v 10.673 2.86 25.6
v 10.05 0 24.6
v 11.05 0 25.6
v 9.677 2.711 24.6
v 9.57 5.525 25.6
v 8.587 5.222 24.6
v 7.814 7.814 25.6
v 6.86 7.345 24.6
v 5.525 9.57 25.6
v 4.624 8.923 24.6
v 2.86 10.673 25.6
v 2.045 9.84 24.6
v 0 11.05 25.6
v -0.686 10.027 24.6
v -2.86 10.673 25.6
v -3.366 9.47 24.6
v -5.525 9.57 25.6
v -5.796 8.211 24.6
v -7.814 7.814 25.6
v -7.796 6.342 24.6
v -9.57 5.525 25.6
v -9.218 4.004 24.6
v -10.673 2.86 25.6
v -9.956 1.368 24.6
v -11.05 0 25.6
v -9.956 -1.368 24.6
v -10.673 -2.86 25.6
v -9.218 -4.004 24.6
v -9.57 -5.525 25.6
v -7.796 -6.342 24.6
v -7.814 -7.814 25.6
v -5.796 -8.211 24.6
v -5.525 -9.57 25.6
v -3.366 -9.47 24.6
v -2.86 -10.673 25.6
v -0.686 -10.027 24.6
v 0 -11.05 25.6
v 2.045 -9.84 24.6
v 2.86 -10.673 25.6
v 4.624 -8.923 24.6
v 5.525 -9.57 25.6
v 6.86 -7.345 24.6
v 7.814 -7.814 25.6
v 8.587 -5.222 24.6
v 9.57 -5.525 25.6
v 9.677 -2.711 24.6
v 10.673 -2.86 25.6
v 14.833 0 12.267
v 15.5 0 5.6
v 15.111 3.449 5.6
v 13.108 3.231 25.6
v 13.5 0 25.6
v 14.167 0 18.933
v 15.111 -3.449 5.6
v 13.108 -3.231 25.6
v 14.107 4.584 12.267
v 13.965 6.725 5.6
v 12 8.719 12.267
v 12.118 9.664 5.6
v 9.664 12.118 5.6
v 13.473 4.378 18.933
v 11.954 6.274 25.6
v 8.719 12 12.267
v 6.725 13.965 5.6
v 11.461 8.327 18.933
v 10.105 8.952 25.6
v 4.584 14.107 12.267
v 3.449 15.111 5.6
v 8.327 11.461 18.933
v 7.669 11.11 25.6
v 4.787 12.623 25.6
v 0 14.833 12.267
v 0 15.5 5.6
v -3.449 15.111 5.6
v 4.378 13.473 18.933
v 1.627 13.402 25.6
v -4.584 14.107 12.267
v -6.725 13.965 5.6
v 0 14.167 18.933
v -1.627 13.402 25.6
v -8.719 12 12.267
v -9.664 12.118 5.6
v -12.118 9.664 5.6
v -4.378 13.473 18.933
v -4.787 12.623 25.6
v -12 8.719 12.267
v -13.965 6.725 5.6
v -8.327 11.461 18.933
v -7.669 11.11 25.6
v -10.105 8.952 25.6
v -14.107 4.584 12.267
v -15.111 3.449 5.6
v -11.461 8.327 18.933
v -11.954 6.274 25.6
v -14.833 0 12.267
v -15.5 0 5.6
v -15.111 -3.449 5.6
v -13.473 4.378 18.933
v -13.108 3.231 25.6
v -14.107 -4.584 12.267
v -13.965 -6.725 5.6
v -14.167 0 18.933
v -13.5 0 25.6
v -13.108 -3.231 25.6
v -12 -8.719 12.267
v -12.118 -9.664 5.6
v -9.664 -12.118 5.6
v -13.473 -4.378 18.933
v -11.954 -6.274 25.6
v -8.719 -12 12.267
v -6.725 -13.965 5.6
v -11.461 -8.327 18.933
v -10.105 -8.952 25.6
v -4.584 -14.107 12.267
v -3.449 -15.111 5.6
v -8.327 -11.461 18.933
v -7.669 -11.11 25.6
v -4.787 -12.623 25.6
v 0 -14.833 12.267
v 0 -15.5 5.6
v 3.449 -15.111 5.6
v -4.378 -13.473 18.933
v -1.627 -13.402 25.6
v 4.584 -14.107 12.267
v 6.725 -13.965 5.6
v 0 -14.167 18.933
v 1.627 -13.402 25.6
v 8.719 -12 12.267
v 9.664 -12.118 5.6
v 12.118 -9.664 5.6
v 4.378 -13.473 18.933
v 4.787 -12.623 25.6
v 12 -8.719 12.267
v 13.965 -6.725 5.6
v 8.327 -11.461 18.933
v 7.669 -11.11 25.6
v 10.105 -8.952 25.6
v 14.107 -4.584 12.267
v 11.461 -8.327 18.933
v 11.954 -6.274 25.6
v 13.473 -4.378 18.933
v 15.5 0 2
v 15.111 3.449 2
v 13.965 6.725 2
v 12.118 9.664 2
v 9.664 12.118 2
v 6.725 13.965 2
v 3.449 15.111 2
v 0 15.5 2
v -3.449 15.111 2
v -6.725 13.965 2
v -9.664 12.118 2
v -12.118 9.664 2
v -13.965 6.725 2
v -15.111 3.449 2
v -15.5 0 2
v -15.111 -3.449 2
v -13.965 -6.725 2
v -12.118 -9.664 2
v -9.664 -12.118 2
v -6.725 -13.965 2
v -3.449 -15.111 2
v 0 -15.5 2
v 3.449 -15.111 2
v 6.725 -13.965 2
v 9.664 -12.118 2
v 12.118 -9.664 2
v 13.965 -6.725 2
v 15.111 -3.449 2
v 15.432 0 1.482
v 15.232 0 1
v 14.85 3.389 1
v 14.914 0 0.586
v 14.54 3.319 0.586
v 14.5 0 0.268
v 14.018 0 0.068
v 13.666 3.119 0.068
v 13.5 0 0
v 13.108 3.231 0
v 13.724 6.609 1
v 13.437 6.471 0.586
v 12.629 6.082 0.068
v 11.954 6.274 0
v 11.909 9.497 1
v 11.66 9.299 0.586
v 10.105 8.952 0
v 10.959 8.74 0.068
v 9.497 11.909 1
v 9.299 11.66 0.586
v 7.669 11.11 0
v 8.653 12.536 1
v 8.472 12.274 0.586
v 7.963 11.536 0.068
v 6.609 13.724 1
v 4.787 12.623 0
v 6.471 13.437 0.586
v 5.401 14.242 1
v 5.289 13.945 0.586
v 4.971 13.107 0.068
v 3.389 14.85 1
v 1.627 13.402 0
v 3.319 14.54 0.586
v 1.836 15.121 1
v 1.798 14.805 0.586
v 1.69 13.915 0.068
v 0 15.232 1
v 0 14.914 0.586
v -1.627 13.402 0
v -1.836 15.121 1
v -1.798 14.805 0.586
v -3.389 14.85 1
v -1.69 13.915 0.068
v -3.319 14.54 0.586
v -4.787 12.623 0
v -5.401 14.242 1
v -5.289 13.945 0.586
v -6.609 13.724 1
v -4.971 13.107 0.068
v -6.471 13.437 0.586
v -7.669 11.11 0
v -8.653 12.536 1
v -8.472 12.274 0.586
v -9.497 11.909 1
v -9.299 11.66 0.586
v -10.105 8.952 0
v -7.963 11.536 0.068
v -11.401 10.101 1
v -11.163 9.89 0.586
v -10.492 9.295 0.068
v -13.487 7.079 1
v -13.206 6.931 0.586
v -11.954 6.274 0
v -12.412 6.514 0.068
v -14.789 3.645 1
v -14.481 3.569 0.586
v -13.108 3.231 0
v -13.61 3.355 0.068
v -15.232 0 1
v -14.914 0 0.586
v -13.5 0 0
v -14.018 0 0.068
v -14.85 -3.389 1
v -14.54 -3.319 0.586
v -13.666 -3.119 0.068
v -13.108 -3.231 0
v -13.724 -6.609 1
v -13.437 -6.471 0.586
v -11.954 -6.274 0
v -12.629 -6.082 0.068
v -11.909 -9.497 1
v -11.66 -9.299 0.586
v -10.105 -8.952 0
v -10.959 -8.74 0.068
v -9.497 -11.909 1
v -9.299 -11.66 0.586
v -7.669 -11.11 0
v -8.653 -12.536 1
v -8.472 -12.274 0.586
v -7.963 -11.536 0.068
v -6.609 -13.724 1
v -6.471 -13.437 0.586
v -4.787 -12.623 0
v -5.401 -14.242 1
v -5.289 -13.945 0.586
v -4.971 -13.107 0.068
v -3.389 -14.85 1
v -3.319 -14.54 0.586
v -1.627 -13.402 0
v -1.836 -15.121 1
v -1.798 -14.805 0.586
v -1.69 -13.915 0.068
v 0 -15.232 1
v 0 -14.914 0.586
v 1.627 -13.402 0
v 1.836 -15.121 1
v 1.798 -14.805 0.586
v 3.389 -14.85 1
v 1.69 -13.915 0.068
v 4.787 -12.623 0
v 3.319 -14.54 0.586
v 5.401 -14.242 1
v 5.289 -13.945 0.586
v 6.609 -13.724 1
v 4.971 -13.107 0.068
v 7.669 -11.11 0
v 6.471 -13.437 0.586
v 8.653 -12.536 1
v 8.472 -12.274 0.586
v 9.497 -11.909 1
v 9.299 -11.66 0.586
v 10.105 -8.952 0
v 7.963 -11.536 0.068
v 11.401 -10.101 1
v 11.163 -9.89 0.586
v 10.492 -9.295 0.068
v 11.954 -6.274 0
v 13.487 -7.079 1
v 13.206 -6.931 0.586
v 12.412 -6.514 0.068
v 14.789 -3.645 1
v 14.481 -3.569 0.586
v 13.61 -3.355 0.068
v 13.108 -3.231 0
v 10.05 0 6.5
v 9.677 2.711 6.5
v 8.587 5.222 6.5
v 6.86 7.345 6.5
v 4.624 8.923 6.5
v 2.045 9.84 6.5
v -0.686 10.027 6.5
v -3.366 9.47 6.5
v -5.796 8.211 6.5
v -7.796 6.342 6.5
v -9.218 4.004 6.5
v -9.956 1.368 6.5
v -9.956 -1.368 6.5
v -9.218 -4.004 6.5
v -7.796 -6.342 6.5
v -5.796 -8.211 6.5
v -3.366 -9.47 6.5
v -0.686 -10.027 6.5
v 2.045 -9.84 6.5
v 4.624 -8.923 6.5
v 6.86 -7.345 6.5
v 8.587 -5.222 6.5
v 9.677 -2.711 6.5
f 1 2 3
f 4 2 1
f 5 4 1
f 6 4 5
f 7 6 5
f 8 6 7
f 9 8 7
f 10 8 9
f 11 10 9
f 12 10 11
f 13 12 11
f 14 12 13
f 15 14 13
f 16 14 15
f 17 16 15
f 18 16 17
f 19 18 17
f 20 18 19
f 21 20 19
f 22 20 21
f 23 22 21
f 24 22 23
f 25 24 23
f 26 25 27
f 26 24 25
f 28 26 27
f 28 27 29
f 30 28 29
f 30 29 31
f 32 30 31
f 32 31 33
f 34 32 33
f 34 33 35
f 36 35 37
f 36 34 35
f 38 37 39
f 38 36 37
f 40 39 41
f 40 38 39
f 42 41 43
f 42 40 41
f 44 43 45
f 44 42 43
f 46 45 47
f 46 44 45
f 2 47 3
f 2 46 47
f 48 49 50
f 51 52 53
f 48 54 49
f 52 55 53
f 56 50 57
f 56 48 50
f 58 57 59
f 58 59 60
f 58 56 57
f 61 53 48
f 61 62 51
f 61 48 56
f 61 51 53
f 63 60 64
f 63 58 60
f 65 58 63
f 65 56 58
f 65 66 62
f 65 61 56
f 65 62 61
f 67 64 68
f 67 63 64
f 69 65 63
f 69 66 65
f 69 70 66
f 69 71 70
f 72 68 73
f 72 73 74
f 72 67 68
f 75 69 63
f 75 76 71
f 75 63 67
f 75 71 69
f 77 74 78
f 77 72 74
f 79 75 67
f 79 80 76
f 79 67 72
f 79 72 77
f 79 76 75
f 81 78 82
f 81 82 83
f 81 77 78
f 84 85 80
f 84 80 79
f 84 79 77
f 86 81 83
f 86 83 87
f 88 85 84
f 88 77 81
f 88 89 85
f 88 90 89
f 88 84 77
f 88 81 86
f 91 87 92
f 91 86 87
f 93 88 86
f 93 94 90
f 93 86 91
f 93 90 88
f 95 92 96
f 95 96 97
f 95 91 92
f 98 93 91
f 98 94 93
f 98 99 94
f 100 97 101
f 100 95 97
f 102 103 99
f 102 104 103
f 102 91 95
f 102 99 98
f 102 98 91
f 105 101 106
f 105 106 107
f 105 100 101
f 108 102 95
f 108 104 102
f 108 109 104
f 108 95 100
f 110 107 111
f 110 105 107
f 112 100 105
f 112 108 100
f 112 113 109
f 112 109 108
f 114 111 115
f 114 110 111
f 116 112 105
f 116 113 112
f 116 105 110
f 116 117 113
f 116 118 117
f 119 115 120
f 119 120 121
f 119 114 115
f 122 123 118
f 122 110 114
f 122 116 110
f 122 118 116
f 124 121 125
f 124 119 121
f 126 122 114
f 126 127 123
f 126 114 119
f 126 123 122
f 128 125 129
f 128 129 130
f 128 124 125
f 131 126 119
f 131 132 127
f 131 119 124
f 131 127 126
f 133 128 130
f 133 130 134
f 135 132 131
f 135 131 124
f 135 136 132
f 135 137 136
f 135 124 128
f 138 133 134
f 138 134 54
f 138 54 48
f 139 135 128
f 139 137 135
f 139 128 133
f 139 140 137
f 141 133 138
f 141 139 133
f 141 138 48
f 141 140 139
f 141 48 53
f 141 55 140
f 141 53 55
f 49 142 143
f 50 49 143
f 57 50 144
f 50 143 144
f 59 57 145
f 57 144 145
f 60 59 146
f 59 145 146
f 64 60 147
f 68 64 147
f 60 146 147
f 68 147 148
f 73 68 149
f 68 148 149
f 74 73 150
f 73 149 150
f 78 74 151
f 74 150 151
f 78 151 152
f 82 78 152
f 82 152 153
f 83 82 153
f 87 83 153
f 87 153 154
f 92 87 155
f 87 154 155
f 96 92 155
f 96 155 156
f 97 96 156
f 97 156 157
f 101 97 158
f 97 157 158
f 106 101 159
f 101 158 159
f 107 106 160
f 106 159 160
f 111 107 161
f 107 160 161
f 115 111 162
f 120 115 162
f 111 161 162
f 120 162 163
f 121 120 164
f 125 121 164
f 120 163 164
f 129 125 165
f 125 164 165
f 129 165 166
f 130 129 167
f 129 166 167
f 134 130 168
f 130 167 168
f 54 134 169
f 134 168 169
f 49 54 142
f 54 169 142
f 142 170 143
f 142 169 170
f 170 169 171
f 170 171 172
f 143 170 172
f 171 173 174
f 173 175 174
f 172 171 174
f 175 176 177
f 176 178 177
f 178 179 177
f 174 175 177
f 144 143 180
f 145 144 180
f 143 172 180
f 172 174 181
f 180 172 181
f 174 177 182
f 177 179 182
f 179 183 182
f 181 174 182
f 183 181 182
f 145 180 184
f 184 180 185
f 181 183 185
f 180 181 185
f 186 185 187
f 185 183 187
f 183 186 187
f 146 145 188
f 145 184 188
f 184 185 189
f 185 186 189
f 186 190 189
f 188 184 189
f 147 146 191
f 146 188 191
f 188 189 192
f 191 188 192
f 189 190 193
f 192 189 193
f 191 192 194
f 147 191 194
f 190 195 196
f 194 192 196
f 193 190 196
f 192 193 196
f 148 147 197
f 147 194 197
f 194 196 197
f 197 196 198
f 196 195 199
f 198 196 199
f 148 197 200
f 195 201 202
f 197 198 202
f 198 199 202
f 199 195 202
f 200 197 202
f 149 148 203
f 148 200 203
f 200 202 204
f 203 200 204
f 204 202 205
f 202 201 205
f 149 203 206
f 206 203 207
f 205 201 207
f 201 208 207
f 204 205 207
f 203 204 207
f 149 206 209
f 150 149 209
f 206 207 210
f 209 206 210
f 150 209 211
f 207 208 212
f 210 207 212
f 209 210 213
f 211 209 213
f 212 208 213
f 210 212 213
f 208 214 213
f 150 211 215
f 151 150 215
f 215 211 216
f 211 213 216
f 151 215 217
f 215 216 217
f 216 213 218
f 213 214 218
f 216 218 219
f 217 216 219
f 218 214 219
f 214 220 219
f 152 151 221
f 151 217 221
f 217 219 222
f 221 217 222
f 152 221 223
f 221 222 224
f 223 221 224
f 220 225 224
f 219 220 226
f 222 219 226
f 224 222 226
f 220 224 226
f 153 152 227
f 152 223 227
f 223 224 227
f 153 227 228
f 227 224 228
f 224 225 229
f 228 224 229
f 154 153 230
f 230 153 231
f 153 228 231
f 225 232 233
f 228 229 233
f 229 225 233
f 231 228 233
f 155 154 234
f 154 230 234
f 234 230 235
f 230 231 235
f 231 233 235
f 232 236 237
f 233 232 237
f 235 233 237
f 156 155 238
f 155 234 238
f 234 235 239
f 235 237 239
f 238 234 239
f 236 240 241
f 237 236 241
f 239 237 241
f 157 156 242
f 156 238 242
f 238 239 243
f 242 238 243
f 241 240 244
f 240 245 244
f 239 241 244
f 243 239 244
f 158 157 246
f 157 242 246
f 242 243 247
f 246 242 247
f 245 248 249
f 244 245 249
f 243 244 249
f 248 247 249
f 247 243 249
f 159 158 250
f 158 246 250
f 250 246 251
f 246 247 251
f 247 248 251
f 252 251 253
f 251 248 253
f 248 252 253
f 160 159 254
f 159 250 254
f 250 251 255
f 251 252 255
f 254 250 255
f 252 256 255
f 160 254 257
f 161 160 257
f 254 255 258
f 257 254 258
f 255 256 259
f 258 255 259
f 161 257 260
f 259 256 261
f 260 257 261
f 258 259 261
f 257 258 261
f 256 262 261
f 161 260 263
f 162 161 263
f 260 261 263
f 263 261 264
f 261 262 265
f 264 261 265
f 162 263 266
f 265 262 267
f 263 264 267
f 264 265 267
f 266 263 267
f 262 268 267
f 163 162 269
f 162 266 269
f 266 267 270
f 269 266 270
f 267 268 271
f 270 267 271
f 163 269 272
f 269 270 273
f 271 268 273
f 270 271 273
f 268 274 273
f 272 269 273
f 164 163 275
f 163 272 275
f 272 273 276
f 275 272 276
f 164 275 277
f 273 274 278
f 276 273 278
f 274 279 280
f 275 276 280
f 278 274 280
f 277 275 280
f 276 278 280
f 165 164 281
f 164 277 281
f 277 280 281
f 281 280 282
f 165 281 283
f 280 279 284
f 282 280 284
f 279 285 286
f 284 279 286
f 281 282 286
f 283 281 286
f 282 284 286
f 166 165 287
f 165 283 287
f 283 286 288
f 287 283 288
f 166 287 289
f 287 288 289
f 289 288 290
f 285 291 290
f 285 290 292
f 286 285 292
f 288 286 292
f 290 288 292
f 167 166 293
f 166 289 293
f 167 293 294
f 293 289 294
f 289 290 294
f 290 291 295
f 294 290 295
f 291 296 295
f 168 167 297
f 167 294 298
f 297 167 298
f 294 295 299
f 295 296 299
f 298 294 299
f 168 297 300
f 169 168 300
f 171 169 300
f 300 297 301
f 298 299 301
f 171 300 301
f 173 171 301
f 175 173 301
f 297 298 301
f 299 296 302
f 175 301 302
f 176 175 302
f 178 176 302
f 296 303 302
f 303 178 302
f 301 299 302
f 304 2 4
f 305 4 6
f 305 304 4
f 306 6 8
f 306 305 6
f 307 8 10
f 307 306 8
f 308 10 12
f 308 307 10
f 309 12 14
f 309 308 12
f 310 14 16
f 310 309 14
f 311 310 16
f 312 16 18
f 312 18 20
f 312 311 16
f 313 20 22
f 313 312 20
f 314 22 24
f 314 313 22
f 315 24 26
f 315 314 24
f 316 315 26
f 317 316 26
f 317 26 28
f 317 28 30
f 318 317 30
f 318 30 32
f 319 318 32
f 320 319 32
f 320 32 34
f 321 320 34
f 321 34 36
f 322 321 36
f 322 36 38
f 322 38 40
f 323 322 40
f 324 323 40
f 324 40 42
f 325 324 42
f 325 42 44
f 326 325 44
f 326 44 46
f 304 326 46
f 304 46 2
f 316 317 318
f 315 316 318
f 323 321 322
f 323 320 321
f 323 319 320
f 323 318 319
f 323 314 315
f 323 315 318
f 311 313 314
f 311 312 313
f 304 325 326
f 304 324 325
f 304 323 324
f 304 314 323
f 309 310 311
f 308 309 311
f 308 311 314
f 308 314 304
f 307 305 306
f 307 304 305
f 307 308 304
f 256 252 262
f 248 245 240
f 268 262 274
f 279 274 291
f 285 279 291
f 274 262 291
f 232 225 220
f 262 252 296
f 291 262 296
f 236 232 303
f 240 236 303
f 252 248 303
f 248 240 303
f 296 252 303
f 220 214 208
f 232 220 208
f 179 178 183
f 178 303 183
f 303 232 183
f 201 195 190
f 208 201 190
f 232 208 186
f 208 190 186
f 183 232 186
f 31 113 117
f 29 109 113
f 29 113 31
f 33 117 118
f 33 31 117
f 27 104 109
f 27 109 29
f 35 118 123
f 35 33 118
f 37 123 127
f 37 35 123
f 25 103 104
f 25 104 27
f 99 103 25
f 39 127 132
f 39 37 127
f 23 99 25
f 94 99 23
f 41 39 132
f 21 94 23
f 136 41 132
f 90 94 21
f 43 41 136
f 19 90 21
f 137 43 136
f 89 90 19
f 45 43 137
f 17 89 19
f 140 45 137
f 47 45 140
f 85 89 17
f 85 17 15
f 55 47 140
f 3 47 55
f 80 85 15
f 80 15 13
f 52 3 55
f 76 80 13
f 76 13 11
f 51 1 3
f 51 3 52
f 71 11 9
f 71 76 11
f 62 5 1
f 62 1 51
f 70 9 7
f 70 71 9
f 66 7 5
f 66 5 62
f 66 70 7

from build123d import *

# Parameters (mm, degrees)
F0_R     = 15.5
F0_R_2   = 10.05
F1_DEPTH = 6.5
F2_DEPTH = 25.6
F3_R     = 2
F4_SIZE2 = 2
F4_SIZE  = 20
F5_SIZE  = 1


with BuildPart() as f1:
    # F0 (on Top) → F1 (new body)
    with BuildSketch(Plane.XY):
        Circle(F0_R)
        Circle(F0_R_2, mode=Mode.SUBTRACT)
        Circle(F0_R_2)
    extrude(amount=F1_DEPTH)

    # F0 (on Top) → F2 (join)
    with BuildSketch(Plane.XY):
        Circle(F0_R)
        Circle(F0_R_2, mode=Mode.SUBTRACT)
    extrude(amount=F2_DEPTH)

    # F3
    f3_edges = [f1.edges().sort_by_distance(p)[0] for p in [
        (-15.5, 0, 0),
    ]]
    fillet(f3_edges, radius=F3_R)

    # F4
    f4_edges = [f1.edges().sort_by_distance(p)[0] for p in [
        (15.5, 0, 13.8),
        (-15.5, 0, 2),
        (-15.5, 0, 25.6),
    ]]
    f4_side = f1.faces().sort_by_distance((-15.5, 0, 13.8))[0]
    chamfer(f4_edges, length=F4_SIZE, length2=F4_SIZE2, reference=f4_side)

    # F5
    f5_edges = [f1.edges().sort_by_distance(p)[0] for p in [
        (-10.05, 0, 25.6),
    ]]
    chamfer(f5_edges, length=F5_SIZE)


solid = f1.part
